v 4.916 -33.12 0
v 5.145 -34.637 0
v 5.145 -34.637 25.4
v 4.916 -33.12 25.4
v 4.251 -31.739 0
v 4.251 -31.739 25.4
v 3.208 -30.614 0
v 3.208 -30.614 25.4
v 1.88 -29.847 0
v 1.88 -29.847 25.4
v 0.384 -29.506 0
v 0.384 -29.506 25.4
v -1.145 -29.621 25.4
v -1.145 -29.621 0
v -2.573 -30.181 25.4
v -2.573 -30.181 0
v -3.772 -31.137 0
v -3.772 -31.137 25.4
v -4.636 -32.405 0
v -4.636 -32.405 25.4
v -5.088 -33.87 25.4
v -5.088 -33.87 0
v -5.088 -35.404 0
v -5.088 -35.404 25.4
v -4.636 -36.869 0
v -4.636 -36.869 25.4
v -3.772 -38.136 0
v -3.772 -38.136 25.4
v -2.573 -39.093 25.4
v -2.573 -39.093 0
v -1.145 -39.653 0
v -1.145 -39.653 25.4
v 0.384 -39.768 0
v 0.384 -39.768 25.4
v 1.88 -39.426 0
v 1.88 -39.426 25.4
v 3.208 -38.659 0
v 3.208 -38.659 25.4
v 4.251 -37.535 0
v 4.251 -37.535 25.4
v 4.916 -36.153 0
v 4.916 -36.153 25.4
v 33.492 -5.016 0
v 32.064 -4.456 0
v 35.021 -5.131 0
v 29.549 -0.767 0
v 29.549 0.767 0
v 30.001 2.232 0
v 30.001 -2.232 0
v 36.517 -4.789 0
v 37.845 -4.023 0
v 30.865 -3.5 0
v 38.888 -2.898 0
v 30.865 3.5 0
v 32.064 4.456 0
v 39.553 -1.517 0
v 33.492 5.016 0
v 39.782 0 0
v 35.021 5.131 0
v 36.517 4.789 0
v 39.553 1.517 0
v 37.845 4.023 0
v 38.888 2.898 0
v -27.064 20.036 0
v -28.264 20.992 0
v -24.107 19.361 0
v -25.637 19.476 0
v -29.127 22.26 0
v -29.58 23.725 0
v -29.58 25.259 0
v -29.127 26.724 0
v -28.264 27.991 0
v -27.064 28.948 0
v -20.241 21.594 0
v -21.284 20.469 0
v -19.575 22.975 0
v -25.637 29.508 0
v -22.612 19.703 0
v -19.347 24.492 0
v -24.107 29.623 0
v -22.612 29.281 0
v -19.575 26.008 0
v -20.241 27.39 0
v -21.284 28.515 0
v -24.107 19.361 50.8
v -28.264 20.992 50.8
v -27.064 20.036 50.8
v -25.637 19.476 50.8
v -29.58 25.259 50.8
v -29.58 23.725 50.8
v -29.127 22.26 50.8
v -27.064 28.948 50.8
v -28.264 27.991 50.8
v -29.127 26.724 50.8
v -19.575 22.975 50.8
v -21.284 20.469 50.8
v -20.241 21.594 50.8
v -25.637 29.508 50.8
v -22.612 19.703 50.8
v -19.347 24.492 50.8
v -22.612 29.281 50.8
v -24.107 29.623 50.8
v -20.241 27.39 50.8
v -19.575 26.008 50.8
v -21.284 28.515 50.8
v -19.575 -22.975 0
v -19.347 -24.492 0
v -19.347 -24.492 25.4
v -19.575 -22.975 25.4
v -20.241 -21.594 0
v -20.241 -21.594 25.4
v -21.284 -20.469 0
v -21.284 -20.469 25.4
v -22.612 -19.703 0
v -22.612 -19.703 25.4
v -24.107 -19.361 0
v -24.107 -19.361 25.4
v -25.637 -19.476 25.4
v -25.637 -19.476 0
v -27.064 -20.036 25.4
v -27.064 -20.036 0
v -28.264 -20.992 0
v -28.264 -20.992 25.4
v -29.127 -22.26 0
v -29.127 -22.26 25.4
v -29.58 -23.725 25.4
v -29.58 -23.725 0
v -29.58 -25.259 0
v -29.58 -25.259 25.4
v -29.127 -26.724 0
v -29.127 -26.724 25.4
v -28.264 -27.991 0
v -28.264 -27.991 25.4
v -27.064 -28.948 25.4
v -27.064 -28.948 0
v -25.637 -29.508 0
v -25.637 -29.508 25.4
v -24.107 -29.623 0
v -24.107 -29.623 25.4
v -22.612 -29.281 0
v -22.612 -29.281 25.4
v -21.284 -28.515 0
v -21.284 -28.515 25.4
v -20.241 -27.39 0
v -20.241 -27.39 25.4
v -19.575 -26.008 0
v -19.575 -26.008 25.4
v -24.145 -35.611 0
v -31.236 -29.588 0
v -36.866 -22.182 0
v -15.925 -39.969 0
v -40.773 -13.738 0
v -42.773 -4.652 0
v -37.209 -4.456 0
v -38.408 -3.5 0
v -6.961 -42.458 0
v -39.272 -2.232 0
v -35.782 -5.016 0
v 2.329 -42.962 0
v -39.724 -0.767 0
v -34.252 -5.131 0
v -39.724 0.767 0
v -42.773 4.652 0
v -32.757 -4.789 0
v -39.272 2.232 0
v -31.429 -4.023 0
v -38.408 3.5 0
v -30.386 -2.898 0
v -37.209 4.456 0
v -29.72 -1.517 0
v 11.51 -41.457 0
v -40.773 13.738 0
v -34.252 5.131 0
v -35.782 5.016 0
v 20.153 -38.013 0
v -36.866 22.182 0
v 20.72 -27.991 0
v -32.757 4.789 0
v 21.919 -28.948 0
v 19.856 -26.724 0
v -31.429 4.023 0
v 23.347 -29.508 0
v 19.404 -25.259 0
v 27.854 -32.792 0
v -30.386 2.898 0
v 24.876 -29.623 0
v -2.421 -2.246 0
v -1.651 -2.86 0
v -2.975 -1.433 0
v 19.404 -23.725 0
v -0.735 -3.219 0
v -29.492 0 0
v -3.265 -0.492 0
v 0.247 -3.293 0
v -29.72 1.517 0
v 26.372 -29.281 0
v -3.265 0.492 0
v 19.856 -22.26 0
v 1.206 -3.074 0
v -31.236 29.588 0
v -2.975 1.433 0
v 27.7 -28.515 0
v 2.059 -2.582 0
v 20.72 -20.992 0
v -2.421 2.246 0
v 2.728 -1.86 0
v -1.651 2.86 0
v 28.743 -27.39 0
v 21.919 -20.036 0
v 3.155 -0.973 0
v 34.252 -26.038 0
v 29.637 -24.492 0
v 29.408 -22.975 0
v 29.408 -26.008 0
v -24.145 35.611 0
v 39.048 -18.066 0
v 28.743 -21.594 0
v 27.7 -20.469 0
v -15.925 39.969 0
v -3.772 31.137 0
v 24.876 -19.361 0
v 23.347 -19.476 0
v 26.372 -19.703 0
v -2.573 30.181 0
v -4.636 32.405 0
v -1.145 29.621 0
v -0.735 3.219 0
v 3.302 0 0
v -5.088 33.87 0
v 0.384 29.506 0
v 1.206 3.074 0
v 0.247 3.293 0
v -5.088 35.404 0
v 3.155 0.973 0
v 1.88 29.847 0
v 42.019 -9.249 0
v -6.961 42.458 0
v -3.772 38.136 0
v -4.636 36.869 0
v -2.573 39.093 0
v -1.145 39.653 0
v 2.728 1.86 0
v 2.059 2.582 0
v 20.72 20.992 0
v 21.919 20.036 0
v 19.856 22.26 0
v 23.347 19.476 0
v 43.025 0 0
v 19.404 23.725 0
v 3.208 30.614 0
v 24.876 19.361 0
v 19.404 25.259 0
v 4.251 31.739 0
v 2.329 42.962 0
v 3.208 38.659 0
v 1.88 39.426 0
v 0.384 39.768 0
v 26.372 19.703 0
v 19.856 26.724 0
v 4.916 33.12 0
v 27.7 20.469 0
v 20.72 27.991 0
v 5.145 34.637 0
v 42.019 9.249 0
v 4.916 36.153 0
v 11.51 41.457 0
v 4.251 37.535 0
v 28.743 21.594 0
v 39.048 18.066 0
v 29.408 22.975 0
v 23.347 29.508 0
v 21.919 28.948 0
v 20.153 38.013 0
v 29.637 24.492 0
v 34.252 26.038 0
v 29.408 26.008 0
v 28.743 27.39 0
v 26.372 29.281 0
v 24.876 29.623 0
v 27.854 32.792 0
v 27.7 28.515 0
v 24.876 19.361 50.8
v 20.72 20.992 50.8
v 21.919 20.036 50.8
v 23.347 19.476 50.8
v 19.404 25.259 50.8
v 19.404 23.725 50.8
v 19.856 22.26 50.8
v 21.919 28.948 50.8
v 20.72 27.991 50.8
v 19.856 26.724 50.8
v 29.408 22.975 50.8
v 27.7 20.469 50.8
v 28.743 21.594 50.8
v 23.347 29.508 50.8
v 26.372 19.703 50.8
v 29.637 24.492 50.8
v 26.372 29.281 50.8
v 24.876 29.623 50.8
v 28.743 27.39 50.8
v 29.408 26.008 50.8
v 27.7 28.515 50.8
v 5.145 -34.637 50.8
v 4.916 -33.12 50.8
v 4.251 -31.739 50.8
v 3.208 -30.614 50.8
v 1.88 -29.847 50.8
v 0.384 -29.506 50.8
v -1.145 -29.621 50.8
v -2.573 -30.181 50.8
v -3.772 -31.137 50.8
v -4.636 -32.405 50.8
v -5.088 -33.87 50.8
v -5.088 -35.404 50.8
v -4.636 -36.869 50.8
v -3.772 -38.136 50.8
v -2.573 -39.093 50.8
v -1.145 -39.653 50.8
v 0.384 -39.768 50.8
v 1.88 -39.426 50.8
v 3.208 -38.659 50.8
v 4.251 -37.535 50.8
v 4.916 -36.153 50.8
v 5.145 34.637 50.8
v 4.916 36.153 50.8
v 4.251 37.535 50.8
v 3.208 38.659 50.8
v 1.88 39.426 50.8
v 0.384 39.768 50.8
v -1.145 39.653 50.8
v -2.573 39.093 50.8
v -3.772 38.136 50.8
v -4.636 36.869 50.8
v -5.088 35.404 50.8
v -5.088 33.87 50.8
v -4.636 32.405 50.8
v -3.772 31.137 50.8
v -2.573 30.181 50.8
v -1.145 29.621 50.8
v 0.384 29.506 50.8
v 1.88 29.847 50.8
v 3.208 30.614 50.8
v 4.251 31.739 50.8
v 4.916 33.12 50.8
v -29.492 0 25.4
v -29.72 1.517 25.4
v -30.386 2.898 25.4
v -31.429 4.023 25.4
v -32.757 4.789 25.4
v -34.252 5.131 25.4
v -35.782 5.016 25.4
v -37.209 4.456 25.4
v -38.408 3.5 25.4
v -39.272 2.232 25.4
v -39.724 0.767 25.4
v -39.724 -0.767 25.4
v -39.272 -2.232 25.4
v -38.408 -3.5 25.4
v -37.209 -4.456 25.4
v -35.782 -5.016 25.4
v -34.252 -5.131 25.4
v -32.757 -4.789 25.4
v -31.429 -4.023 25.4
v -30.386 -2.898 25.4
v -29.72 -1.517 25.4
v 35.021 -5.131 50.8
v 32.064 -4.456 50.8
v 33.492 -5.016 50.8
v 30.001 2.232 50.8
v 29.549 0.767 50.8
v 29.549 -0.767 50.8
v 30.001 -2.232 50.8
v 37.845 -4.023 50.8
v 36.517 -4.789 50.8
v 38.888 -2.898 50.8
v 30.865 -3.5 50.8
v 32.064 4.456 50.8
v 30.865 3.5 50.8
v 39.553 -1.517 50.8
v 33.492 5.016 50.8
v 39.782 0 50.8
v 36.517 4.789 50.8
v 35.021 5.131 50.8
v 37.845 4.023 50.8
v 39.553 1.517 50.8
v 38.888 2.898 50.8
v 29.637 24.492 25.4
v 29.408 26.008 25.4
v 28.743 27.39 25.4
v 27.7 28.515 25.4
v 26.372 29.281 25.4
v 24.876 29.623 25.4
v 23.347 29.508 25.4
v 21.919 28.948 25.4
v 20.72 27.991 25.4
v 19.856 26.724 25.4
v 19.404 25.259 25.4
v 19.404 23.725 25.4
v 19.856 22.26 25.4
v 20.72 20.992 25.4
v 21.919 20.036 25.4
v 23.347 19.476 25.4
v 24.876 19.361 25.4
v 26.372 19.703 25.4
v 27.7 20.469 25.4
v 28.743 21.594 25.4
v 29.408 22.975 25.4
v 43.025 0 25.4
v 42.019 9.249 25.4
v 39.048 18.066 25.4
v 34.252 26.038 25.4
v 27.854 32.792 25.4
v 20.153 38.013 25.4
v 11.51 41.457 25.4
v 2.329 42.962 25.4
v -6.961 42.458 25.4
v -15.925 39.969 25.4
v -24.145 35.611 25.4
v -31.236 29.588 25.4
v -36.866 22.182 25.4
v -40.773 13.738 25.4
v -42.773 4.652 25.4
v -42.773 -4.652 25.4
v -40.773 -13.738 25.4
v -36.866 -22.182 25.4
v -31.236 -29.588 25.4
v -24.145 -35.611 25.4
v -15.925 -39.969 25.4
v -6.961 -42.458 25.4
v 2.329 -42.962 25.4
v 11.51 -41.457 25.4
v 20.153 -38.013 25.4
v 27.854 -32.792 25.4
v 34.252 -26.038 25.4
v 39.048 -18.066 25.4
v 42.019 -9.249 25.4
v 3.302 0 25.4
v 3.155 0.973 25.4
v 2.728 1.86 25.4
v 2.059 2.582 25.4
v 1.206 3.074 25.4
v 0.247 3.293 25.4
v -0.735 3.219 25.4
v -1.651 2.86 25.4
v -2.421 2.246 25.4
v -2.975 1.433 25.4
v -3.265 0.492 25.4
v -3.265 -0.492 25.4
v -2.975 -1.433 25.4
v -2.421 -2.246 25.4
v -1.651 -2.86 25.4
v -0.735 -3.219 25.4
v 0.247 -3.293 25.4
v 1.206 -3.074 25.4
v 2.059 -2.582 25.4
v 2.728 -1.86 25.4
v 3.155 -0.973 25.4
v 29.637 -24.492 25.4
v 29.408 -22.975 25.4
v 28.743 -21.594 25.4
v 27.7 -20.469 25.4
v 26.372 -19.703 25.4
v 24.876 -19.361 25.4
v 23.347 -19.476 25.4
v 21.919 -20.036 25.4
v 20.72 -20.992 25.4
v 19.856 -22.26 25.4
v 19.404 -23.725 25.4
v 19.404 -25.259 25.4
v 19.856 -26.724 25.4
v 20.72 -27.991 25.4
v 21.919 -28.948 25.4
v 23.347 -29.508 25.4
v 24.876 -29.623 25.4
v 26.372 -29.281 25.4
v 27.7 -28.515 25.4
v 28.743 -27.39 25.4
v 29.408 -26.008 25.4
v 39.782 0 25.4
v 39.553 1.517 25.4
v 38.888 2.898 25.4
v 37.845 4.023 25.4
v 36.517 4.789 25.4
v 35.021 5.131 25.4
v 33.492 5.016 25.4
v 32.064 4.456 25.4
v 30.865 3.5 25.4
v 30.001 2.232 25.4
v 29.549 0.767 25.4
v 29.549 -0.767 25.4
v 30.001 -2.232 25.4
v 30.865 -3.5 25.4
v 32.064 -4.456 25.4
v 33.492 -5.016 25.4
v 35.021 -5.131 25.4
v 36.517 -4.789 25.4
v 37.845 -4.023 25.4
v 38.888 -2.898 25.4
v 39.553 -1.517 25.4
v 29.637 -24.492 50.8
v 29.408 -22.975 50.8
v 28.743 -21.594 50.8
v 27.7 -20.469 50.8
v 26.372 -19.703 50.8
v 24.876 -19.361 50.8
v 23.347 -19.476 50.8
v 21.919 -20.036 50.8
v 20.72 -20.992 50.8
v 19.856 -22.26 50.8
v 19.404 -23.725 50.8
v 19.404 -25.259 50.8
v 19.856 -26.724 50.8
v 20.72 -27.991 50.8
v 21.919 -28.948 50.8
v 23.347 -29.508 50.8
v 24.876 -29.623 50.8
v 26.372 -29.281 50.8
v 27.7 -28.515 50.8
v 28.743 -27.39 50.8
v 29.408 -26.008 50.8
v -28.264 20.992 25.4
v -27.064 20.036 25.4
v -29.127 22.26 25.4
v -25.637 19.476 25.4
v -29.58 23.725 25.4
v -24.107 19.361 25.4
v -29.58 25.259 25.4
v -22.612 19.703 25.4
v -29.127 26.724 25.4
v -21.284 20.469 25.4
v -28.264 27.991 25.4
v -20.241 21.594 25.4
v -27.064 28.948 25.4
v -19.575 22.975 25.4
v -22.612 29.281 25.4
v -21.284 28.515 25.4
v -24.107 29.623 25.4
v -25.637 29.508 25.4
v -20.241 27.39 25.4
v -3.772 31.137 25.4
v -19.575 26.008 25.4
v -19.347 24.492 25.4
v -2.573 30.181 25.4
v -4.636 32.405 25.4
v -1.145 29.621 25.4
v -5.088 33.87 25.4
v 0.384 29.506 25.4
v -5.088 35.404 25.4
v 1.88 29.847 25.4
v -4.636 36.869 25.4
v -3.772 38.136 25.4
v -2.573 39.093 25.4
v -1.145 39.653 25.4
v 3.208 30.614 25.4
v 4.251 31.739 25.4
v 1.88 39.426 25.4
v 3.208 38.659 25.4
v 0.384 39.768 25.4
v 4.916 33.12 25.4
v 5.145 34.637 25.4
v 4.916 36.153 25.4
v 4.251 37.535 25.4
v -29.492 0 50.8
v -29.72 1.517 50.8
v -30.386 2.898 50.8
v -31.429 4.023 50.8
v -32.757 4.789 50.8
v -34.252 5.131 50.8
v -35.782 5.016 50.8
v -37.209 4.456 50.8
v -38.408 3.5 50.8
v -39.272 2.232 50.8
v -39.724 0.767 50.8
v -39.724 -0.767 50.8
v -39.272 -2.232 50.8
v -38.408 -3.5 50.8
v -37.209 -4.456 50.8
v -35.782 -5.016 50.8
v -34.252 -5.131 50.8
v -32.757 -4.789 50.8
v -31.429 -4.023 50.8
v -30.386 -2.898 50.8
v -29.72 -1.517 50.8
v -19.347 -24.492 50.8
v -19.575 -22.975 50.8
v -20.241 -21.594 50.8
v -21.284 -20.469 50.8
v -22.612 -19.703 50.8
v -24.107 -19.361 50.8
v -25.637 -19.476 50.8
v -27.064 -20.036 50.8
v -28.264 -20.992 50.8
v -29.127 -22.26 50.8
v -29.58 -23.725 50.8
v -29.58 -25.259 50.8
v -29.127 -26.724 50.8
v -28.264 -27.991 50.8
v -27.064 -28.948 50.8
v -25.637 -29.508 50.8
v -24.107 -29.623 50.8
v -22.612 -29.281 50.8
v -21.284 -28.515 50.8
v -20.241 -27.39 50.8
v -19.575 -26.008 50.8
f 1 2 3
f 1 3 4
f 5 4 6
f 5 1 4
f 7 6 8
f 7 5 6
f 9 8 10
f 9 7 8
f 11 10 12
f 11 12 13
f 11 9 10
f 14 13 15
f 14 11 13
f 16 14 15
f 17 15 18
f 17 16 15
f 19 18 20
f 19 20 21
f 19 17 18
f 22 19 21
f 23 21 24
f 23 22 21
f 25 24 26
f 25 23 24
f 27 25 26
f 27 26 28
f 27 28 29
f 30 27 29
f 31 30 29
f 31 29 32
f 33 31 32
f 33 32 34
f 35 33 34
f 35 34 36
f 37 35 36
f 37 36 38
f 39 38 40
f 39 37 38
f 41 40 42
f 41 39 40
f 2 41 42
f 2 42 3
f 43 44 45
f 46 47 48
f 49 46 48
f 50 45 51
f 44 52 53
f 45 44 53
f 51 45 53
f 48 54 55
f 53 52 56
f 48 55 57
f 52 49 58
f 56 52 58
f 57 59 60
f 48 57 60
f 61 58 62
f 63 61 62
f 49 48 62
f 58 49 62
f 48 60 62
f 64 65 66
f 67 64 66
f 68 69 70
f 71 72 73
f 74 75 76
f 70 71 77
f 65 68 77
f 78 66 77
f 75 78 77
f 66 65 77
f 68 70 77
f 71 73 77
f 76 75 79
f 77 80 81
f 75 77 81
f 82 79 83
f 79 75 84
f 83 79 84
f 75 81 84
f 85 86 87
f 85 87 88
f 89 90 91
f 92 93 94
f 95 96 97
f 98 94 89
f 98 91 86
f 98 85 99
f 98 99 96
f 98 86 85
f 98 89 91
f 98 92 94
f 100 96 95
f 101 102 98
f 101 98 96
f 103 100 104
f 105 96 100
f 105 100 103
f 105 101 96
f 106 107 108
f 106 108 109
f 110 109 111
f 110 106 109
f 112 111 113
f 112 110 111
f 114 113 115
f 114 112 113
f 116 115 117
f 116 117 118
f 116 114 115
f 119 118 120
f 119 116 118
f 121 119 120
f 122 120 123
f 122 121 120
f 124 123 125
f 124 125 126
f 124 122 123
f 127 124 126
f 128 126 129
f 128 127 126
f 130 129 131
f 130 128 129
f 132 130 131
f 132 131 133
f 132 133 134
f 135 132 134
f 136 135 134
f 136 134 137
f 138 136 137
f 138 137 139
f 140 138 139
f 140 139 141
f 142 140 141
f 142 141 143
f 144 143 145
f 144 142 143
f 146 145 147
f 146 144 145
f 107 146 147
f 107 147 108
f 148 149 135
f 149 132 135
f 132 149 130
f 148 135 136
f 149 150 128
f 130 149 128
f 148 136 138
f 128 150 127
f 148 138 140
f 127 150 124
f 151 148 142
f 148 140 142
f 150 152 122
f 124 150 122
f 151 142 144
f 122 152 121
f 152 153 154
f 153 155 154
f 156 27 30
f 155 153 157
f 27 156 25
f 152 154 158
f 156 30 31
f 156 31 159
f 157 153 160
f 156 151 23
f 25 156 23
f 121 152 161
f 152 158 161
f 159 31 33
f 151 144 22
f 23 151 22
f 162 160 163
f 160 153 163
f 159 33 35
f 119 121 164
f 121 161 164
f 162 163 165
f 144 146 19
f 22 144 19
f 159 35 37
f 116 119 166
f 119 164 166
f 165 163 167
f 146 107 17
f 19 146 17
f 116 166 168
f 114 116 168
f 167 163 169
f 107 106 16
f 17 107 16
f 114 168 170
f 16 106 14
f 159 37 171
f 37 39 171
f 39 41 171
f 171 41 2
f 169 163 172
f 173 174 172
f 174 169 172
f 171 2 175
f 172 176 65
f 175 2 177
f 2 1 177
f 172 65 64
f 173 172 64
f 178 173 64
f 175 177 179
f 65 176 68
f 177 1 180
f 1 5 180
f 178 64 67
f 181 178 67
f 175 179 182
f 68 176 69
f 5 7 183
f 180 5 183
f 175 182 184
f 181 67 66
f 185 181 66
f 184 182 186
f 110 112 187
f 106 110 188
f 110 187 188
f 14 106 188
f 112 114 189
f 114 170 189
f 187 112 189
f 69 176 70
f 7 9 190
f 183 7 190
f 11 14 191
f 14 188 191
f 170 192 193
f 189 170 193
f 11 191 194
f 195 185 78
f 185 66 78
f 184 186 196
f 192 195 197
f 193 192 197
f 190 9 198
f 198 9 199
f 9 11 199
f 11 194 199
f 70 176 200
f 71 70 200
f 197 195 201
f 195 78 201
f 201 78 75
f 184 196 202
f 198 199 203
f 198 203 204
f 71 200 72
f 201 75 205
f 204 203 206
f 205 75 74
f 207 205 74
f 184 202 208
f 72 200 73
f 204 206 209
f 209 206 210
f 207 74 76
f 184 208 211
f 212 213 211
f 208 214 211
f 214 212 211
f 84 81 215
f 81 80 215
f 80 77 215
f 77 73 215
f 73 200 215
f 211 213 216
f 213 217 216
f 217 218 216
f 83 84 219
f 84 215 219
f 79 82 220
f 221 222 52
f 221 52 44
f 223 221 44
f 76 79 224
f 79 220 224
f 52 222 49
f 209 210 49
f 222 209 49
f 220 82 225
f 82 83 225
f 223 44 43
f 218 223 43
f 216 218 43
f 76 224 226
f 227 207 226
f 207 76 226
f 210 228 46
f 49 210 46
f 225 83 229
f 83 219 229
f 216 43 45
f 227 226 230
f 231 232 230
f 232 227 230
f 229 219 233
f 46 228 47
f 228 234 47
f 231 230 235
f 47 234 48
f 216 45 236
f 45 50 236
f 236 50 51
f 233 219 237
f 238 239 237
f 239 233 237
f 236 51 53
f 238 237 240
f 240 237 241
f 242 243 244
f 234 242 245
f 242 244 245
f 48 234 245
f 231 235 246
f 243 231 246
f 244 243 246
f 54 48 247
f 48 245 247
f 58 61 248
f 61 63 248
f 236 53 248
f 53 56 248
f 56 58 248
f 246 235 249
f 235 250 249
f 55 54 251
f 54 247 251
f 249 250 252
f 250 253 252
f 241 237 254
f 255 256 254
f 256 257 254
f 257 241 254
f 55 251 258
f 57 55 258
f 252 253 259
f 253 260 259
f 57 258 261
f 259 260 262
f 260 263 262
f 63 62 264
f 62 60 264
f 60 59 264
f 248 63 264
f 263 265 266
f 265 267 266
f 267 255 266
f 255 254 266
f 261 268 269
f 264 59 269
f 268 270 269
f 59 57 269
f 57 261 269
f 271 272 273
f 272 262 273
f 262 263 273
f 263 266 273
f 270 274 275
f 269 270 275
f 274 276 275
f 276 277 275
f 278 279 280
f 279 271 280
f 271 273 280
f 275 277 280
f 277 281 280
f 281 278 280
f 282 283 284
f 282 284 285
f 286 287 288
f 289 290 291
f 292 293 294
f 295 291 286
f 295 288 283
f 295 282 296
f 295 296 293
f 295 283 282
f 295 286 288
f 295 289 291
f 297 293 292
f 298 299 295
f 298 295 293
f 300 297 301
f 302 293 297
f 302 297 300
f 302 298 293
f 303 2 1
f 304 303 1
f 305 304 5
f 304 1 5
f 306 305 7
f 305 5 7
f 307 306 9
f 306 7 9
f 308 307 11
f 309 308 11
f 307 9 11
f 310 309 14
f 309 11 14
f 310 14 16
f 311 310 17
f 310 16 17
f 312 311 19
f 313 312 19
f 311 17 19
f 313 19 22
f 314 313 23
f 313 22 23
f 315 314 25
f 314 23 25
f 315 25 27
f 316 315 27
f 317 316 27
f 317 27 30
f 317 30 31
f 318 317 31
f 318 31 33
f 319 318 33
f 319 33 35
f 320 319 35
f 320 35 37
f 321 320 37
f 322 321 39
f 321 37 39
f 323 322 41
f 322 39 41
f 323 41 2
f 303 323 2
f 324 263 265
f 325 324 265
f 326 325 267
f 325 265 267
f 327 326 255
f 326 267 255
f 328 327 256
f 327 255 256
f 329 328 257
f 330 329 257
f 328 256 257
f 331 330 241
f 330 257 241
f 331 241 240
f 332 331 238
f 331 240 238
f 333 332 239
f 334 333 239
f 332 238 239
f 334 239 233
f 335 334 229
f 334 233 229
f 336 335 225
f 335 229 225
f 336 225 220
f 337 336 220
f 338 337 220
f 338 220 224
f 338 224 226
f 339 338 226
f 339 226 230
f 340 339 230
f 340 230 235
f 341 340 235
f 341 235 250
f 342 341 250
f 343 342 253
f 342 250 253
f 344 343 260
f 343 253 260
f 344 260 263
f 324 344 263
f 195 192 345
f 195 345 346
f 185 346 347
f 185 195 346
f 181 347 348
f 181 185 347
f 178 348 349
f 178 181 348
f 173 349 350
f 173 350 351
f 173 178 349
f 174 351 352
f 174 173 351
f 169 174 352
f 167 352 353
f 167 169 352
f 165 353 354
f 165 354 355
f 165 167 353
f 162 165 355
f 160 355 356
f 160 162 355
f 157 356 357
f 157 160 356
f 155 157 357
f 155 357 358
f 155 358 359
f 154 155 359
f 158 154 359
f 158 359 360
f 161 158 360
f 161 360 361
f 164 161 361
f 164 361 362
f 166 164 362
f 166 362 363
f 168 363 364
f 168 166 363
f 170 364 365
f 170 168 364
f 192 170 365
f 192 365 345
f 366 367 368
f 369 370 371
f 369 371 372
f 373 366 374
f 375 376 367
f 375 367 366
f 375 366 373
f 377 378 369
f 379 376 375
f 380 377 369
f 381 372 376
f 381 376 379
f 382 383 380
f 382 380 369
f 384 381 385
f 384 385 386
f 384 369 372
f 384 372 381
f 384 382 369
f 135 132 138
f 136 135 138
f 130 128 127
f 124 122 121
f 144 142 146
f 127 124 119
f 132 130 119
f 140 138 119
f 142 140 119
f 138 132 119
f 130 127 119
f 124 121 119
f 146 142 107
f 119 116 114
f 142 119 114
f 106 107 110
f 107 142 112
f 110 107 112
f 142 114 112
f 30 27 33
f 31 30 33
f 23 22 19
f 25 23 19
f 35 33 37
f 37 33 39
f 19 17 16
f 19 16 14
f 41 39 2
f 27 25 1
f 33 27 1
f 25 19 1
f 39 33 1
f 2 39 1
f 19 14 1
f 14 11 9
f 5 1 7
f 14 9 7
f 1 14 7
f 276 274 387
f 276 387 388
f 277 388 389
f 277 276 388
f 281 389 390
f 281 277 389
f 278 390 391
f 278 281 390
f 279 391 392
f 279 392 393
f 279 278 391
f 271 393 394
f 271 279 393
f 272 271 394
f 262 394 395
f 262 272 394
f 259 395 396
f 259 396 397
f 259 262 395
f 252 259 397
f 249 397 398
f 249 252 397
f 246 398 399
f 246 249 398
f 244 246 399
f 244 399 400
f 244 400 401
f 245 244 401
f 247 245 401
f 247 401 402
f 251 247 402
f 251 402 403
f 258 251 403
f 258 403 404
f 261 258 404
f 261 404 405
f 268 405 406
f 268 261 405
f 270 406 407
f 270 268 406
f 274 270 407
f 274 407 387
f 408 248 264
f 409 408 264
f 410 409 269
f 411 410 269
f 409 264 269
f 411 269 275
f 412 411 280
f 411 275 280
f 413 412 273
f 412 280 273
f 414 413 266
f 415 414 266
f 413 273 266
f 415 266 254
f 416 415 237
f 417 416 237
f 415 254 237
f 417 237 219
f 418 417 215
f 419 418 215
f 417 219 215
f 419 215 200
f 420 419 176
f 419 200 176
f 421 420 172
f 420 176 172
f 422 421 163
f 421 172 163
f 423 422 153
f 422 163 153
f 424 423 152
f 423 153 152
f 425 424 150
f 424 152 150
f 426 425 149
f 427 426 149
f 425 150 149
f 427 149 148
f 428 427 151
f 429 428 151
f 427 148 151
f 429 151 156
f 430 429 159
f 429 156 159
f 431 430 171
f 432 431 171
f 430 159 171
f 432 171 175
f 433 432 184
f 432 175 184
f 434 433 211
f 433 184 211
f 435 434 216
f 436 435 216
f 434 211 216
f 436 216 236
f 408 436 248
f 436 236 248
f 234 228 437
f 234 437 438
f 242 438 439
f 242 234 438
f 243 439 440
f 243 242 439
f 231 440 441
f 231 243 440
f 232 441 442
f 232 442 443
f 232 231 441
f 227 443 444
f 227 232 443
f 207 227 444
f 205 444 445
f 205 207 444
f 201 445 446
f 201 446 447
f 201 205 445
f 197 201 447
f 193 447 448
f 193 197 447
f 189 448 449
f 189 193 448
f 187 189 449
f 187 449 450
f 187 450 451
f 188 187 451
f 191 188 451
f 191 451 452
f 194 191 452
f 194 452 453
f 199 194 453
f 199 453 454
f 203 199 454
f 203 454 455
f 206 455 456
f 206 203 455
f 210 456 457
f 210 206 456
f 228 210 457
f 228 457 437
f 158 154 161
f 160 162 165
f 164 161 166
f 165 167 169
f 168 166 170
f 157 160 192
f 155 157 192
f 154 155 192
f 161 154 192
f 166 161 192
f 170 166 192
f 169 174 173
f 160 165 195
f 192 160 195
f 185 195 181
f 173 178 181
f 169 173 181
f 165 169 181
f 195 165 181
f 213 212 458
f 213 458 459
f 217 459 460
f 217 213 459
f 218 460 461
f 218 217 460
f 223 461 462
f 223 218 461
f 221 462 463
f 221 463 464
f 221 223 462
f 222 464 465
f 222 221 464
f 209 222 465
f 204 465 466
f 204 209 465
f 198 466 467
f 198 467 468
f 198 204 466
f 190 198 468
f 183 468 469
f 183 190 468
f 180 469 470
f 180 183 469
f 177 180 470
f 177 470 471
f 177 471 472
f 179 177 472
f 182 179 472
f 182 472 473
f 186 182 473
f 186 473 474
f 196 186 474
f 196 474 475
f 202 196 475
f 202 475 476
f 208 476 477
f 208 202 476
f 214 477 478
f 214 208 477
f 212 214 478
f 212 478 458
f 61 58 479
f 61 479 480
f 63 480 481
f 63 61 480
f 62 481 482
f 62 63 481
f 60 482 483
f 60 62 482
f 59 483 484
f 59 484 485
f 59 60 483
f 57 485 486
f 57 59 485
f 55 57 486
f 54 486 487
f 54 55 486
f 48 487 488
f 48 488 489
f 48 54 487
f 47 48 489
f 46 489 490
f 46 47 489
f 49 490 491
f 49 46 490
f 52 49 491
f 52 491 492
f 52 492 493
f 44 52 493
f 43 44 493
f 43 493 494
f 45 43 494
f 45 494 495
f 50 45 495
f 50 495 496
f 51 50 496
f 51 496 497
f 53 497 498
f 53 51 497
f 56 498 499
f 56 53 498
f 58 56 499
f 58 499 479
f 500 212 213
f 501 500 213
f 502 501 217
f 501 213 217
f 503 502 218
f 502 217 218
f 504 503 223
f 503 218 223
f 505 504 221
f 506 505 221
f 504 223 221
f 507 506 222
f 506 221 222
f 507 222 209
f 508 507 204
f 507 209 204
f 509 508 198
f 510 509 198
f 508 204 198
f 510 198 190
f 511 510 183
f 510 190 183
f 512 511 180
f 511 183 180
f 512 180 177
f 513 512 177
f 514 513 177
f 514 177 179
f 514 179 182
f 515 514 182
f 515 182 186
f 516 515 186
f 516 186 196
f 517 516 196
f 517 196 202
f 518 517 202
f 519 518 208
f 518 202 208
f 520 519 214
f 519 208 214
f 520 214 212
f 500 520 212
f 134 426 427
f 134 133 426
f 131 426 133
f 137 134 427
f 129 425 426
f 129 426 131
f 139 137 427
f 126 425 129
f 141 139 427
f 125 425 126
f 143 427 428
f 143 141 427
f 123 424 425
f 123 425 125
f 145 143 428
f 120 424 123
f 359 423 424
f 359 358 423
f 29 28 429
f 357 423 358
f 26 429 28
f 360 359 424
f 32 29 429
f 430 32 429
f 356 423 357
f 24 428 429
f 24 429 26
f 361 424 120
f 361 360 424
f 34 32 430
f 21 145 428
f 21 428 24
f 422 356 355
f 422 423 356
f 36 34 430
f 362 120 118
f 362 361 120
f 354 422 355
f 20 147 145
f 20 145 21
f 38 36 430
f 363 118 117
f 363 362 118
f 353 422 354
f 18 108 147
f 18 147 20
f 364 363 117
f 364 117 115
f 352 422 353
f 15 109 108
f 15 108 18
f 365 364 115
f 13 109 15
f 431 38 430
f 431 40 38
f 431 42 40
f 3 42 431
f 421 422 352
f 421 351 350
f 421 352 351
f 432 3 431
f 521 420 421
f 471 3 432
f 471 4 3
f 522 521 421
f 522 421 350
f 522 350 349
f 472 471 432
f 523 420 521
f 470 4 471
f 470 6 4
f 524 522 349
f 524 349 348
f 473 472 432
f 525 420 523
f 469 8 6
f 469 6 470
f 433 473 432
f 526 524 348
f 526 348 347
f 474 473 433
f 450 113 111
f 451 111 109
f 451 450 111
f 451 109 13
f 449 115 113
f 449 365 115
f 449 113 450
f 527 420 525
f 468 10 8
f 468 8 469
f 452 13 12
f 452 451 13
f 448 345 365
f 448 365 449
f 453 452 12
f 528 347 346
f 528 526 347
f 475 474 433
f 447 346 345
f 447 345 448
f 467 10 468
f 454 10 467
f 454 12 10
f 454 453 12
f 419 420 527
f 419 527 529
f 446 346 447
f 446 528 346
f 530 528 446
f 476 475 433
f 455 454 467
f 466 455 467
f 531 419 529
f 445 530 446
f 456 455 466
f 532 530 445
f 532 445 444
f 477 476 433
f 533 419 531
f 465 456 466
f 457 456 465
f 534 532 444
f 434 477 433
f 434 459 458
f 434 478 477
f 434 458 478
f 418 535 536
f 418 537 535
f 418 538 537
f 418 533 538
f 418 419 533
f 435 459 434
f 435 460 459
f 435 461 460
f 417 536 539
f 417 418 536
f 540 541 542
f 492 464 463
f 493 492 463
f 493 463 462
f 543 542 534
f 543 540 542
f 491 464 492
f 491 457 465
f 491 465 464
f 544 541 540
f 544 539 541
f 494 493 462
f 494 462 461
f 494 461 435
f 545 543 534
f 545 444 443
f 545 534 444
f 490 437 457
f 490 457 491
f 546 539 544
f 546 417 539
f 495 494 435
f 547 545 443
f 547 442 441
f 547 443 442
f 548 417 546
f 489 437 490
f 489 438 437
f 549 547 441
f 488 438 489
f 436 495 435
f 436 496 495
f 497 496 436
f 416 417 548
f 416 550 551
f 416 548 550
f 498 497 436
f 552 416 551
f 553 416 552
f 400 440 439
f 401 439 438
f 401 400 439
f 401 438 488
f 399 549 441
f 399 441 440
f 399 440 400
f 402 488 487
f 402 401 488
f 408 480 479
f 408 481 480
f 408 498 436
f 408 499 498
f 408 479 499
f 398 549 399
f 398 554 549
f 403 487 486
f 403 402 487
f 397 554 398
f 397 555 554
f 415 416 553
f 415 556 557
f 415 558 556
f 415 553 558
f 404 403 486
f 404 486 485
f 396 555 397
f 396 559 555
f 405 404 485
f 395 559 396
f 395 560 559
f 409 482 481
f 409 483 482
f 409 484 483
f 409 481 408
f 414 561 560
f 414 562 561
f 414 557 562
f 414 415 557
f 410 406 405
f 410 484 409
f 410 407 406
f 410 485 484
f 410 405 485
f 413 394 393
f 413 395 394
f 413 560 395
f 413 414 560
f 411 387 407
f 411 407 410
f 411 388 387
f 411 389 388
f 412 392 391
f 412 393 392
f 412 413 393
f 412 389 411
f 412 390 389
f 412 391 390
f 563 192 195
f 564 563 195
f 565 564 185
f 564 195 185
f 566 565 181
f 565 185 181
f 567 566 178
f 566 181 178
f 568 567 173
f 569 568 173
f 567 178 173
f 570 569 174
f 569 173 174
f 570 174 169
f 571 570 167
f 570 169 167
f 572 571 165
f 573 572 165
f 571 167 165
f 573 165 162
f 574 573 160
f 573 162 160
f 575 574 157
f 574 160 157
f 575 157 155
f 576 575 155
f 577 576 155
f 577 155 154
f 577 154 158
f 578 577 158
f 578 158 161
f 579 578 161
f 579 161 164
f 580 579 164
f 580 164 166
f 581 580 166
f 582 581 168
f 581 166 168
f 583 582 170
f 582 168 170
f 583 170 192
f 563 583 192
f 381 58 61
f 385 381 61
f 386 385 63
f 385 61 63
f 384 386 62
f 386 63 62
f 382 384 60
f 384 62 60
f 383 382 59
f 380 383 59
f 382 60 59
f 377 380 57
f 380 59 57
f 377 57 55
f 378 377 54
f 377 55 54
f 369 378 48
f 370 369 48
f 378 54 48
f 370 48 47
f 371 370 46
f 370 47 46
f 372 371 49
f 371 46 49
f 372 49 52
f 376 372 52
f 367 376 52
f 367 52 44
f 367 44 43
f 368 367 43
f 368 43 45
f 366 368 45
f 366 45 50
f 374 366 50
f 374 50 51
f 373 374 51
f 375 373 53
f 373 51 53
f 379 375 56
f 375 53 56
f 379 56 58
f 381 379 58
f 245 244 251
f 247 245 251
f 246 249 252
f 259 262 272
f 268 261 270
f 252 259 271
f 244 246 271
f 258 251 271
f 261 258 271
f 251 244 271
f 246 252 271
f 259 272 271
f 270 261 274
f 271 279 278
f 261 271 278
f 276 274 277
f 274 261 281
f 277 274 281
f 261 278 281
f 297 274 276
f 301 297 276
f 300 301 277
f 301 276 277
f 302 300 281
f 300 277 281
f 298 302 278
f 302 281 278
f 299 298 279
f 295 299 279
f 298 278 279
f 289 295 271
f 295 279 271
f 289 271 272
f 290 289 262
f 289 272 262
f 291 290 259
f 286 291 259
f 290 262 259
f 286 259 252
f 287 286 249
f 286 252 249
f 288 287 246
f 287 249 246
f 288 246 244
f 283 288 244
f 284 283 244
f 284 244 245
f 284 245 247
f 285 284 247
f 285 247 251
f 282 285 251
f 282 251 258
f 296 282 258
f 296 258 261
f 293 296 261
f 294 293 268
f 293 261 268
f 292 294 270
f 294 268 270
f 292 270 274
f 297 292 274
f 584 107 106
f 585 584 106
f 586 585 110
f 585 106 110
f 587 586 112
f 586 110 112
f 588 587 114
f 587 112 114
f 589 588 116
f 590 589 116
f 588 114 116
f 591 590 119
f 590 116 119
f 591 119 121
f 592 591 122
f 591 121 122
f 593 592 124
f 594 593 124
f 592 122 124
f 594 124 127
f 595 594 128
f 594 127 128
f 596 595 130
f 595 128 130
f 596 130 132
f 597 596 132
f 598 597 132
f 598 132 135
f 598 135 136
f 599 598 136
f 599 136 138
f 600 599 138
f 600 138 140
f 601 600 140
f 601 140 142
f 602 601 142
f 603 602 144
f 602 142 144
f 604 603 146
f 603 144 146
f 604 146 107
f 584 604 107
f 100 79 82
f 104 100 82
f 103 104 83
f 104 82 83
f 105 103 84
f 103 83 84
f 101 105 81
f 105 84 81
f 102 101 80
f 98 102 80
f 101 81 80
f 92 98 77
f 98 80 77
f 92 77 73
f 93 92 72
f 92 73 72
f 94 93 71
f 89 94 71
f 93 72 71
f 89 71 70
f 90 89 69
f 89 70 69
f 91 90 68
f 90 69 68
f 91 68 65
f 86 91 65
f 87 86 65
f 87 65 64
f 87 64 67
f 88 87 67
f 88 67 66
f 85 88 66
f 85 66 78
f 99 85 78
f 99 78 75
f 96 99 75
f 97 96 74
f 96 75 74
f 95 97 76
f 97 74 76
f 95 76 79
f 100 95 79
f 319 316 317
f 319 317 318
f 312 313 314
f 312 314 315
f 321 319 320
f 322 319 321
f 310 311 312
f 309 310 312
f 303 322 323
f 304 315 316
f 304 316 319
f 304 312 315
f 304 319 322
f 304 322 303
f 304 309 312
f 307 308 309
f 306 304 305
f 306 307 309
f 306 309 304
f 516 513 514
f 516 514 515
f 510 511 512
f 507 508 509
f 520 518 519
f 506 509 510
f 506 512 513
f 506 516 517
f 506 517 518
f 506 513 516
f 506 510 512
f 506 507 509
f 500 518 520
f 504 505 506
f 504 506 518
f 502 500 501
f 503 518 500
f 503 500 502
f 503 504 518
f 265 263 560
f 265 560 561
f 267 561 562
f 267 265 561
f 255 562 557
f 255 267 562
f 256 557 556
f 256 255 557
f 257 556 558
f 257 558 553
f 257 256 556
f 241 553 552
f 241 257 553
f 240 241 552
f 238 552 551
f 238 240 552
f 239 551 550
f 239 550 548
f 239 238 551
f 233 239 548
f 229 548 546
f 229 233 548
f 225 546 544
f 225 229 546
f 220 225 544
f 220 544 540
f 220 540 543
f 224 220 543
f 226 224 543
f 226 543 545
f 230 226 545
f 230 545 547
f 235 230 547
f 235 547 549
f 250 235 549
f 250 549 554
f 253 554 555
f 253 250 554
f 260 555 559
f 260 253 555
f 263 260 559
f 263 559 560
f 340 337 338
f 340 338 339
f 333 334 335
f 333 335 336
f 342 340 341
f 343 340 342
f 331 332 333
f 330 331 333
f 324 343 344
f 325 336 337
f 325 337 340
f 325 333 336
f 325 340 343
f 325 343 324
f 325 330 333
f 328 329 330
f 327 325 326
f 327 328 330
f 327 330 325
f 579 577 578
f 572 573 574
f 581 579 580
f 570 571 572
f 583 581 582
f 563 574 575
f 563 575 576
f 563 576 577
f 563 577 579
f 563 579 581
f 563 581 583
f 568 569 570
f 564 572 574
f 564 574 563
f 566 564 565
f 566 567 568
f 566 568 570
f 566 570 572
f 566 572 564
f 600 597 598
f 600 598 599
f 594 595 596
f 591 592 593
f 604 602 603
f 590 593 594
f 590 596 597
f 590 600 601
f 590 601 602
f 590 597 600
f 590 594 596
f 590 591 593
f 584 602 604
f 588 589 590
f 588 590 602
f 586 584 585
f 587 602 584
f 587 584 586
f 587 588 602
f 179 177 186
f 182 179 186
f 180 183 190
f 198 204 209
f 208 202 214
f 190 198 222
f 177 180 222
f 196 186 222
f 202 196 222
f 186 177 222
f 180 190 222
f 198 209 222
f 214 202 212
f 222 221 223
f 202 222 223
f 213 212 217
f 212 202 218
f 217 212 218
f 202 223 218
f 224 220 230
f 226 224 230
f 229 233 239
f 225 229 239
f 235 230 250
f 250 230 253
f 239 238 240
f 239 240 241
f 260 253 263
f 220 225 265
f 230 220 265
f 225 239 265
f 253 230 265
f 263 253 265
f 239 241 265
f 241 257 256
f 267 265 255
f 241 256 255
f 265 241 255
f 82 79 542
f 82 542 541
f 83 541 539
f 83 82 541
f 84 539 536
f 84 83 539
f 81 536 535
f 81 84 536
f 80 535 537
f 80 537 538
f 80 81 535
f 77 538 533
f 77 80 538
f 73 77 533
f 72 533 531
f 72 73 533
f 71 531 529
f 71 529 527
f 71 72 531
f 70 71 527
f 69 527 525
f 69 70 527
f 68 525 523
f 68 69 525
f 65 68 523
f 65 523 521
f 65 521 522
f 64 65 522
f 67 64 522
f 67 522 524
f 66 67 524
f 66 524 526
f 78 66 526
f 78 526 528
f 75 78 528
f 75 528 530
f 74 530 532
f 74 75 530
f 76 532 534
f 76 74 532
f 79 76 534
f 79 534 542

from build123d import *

# Parameters (mm, degrees)
F0_R     = 5.145044
F1_DEPTH = 50.8
F2_DEPTH = 50.8
F3_DEPTH = 50.8
F4_DEPTH = 50.8
F5_DEPTH = 50.8
F6_DEPTH = 50.8
F7_DEPTH = 50.8
F8_DEPTH = 50.8
F0_R_2   = 43.024992
F0_R_3   = 3.302
F9_DEPTH = 25.4


with BuildPart() as f1:
    # F0 (on Top) → F1 (new body)
    with BuildSketch(Plane.XY):
        with Locations((0, 34.636855)):
            Circle(F0_R)
    extrude(amount=F1_DEPTH)


with BuildPart() as f2:
    # F0 (on Top) → F2 (new body)
    with BuildSketch(Plane.XY):
        with Locations((-24.491955, 24.491955)):
            Circle(F0_R)
    extrude(amount=F2_DEPTH)


with BuildPart() as f3:
    # F0 (on Top) → F3 (new body)
    with BuildSketch(Plane.XY):
        with Locations((-34.636855, 0)):
            Circle(F0_R)
    extrude(amount=F3_DEPTH)


with BuildPart() as f4:
    # F0 (on Top) → F4 (new body)
    with BuildSketch(Plane.XY):
        with Locations((-24.491955, -24.491955)):
            Circle(F0_R)
    extrude(amount=F4_DEPTH)


with BuildPart() as f5:
    # F0 (on Top) → F5 (new body)
    with BuildSketch(Plane.XY):
        with Locations((0, -34.636855)):
            Circle(F0_R)
    extrude(amount=F5_DEPTH)


with BuildPart() as f6:
    # F0 (on Top) → F6 (new body)
    with BuildSketch(Plane.XY):
        with Locations((24.491955, -24.491955)):
            Circle(F0_R)
    extrude(amount=F6_DEPTH)


with BuildPart() as f7:
    # F0 (on Top) → F7 (new body)
    with BuildSketch(Plane.XY):
        with Locations((34.636855, 0)):
            Circle(F0_R)
    extrude(amount=F7_DEPTH)


with BuildPart() as f8:
    # F0 (on Top) → F8 (new body)
    with BuildSketch(Plane.XY):
        with Locations((24.491955, 24.491955)):
            Circle(F0_R)
    extrude(amount=F8_DEPTH)


with BuildPart() as f9:
    # F0 (on Top) → F9 (new body)
    with BuildSketch(Plane.XY):
        Circle(F0_R_2)
        with Locations((-24.491955, -24.491955)):
            Circle(F0_R, mode=Mode.SUBTRACT)
        with Locations((0, -34.636855)):
            Circle(F0_R, mode=Mode.SUBTRACT)
        with Locations((-34.636855, 0)):
            Circle(F0_R, mode=Mode.SUBTRACT)
        Circle(F0_R_3, mode=Mode.SUBTRACT)
        with Locations((24.491955, -24.491955)):
            Circle(F0_R, mode=Mode.SUBTRACT)
        with Locations((34.636855, 0)):
            Circle(F0_R, mode=Mode.SUBTRACT)
        with Locations((-24.491955, 24.491955)):
            Circle(F0_R, mode=Mode.SUBTRACT)
        with Locations((0, 34.636855)):
            Circle(F0_R, mode=Mode.SUBTRACT)
        with Locations((24.491955, 24.491955)):
            Circle(F0_R, mode=Mode.SUBTRACT)
    extrude(amount=F9_DEPTH)


solid = Compound([f1.part, f2.part, f3.part, f4.part, f5.part, f6.part, f7.part, f8.part, f9.part])
